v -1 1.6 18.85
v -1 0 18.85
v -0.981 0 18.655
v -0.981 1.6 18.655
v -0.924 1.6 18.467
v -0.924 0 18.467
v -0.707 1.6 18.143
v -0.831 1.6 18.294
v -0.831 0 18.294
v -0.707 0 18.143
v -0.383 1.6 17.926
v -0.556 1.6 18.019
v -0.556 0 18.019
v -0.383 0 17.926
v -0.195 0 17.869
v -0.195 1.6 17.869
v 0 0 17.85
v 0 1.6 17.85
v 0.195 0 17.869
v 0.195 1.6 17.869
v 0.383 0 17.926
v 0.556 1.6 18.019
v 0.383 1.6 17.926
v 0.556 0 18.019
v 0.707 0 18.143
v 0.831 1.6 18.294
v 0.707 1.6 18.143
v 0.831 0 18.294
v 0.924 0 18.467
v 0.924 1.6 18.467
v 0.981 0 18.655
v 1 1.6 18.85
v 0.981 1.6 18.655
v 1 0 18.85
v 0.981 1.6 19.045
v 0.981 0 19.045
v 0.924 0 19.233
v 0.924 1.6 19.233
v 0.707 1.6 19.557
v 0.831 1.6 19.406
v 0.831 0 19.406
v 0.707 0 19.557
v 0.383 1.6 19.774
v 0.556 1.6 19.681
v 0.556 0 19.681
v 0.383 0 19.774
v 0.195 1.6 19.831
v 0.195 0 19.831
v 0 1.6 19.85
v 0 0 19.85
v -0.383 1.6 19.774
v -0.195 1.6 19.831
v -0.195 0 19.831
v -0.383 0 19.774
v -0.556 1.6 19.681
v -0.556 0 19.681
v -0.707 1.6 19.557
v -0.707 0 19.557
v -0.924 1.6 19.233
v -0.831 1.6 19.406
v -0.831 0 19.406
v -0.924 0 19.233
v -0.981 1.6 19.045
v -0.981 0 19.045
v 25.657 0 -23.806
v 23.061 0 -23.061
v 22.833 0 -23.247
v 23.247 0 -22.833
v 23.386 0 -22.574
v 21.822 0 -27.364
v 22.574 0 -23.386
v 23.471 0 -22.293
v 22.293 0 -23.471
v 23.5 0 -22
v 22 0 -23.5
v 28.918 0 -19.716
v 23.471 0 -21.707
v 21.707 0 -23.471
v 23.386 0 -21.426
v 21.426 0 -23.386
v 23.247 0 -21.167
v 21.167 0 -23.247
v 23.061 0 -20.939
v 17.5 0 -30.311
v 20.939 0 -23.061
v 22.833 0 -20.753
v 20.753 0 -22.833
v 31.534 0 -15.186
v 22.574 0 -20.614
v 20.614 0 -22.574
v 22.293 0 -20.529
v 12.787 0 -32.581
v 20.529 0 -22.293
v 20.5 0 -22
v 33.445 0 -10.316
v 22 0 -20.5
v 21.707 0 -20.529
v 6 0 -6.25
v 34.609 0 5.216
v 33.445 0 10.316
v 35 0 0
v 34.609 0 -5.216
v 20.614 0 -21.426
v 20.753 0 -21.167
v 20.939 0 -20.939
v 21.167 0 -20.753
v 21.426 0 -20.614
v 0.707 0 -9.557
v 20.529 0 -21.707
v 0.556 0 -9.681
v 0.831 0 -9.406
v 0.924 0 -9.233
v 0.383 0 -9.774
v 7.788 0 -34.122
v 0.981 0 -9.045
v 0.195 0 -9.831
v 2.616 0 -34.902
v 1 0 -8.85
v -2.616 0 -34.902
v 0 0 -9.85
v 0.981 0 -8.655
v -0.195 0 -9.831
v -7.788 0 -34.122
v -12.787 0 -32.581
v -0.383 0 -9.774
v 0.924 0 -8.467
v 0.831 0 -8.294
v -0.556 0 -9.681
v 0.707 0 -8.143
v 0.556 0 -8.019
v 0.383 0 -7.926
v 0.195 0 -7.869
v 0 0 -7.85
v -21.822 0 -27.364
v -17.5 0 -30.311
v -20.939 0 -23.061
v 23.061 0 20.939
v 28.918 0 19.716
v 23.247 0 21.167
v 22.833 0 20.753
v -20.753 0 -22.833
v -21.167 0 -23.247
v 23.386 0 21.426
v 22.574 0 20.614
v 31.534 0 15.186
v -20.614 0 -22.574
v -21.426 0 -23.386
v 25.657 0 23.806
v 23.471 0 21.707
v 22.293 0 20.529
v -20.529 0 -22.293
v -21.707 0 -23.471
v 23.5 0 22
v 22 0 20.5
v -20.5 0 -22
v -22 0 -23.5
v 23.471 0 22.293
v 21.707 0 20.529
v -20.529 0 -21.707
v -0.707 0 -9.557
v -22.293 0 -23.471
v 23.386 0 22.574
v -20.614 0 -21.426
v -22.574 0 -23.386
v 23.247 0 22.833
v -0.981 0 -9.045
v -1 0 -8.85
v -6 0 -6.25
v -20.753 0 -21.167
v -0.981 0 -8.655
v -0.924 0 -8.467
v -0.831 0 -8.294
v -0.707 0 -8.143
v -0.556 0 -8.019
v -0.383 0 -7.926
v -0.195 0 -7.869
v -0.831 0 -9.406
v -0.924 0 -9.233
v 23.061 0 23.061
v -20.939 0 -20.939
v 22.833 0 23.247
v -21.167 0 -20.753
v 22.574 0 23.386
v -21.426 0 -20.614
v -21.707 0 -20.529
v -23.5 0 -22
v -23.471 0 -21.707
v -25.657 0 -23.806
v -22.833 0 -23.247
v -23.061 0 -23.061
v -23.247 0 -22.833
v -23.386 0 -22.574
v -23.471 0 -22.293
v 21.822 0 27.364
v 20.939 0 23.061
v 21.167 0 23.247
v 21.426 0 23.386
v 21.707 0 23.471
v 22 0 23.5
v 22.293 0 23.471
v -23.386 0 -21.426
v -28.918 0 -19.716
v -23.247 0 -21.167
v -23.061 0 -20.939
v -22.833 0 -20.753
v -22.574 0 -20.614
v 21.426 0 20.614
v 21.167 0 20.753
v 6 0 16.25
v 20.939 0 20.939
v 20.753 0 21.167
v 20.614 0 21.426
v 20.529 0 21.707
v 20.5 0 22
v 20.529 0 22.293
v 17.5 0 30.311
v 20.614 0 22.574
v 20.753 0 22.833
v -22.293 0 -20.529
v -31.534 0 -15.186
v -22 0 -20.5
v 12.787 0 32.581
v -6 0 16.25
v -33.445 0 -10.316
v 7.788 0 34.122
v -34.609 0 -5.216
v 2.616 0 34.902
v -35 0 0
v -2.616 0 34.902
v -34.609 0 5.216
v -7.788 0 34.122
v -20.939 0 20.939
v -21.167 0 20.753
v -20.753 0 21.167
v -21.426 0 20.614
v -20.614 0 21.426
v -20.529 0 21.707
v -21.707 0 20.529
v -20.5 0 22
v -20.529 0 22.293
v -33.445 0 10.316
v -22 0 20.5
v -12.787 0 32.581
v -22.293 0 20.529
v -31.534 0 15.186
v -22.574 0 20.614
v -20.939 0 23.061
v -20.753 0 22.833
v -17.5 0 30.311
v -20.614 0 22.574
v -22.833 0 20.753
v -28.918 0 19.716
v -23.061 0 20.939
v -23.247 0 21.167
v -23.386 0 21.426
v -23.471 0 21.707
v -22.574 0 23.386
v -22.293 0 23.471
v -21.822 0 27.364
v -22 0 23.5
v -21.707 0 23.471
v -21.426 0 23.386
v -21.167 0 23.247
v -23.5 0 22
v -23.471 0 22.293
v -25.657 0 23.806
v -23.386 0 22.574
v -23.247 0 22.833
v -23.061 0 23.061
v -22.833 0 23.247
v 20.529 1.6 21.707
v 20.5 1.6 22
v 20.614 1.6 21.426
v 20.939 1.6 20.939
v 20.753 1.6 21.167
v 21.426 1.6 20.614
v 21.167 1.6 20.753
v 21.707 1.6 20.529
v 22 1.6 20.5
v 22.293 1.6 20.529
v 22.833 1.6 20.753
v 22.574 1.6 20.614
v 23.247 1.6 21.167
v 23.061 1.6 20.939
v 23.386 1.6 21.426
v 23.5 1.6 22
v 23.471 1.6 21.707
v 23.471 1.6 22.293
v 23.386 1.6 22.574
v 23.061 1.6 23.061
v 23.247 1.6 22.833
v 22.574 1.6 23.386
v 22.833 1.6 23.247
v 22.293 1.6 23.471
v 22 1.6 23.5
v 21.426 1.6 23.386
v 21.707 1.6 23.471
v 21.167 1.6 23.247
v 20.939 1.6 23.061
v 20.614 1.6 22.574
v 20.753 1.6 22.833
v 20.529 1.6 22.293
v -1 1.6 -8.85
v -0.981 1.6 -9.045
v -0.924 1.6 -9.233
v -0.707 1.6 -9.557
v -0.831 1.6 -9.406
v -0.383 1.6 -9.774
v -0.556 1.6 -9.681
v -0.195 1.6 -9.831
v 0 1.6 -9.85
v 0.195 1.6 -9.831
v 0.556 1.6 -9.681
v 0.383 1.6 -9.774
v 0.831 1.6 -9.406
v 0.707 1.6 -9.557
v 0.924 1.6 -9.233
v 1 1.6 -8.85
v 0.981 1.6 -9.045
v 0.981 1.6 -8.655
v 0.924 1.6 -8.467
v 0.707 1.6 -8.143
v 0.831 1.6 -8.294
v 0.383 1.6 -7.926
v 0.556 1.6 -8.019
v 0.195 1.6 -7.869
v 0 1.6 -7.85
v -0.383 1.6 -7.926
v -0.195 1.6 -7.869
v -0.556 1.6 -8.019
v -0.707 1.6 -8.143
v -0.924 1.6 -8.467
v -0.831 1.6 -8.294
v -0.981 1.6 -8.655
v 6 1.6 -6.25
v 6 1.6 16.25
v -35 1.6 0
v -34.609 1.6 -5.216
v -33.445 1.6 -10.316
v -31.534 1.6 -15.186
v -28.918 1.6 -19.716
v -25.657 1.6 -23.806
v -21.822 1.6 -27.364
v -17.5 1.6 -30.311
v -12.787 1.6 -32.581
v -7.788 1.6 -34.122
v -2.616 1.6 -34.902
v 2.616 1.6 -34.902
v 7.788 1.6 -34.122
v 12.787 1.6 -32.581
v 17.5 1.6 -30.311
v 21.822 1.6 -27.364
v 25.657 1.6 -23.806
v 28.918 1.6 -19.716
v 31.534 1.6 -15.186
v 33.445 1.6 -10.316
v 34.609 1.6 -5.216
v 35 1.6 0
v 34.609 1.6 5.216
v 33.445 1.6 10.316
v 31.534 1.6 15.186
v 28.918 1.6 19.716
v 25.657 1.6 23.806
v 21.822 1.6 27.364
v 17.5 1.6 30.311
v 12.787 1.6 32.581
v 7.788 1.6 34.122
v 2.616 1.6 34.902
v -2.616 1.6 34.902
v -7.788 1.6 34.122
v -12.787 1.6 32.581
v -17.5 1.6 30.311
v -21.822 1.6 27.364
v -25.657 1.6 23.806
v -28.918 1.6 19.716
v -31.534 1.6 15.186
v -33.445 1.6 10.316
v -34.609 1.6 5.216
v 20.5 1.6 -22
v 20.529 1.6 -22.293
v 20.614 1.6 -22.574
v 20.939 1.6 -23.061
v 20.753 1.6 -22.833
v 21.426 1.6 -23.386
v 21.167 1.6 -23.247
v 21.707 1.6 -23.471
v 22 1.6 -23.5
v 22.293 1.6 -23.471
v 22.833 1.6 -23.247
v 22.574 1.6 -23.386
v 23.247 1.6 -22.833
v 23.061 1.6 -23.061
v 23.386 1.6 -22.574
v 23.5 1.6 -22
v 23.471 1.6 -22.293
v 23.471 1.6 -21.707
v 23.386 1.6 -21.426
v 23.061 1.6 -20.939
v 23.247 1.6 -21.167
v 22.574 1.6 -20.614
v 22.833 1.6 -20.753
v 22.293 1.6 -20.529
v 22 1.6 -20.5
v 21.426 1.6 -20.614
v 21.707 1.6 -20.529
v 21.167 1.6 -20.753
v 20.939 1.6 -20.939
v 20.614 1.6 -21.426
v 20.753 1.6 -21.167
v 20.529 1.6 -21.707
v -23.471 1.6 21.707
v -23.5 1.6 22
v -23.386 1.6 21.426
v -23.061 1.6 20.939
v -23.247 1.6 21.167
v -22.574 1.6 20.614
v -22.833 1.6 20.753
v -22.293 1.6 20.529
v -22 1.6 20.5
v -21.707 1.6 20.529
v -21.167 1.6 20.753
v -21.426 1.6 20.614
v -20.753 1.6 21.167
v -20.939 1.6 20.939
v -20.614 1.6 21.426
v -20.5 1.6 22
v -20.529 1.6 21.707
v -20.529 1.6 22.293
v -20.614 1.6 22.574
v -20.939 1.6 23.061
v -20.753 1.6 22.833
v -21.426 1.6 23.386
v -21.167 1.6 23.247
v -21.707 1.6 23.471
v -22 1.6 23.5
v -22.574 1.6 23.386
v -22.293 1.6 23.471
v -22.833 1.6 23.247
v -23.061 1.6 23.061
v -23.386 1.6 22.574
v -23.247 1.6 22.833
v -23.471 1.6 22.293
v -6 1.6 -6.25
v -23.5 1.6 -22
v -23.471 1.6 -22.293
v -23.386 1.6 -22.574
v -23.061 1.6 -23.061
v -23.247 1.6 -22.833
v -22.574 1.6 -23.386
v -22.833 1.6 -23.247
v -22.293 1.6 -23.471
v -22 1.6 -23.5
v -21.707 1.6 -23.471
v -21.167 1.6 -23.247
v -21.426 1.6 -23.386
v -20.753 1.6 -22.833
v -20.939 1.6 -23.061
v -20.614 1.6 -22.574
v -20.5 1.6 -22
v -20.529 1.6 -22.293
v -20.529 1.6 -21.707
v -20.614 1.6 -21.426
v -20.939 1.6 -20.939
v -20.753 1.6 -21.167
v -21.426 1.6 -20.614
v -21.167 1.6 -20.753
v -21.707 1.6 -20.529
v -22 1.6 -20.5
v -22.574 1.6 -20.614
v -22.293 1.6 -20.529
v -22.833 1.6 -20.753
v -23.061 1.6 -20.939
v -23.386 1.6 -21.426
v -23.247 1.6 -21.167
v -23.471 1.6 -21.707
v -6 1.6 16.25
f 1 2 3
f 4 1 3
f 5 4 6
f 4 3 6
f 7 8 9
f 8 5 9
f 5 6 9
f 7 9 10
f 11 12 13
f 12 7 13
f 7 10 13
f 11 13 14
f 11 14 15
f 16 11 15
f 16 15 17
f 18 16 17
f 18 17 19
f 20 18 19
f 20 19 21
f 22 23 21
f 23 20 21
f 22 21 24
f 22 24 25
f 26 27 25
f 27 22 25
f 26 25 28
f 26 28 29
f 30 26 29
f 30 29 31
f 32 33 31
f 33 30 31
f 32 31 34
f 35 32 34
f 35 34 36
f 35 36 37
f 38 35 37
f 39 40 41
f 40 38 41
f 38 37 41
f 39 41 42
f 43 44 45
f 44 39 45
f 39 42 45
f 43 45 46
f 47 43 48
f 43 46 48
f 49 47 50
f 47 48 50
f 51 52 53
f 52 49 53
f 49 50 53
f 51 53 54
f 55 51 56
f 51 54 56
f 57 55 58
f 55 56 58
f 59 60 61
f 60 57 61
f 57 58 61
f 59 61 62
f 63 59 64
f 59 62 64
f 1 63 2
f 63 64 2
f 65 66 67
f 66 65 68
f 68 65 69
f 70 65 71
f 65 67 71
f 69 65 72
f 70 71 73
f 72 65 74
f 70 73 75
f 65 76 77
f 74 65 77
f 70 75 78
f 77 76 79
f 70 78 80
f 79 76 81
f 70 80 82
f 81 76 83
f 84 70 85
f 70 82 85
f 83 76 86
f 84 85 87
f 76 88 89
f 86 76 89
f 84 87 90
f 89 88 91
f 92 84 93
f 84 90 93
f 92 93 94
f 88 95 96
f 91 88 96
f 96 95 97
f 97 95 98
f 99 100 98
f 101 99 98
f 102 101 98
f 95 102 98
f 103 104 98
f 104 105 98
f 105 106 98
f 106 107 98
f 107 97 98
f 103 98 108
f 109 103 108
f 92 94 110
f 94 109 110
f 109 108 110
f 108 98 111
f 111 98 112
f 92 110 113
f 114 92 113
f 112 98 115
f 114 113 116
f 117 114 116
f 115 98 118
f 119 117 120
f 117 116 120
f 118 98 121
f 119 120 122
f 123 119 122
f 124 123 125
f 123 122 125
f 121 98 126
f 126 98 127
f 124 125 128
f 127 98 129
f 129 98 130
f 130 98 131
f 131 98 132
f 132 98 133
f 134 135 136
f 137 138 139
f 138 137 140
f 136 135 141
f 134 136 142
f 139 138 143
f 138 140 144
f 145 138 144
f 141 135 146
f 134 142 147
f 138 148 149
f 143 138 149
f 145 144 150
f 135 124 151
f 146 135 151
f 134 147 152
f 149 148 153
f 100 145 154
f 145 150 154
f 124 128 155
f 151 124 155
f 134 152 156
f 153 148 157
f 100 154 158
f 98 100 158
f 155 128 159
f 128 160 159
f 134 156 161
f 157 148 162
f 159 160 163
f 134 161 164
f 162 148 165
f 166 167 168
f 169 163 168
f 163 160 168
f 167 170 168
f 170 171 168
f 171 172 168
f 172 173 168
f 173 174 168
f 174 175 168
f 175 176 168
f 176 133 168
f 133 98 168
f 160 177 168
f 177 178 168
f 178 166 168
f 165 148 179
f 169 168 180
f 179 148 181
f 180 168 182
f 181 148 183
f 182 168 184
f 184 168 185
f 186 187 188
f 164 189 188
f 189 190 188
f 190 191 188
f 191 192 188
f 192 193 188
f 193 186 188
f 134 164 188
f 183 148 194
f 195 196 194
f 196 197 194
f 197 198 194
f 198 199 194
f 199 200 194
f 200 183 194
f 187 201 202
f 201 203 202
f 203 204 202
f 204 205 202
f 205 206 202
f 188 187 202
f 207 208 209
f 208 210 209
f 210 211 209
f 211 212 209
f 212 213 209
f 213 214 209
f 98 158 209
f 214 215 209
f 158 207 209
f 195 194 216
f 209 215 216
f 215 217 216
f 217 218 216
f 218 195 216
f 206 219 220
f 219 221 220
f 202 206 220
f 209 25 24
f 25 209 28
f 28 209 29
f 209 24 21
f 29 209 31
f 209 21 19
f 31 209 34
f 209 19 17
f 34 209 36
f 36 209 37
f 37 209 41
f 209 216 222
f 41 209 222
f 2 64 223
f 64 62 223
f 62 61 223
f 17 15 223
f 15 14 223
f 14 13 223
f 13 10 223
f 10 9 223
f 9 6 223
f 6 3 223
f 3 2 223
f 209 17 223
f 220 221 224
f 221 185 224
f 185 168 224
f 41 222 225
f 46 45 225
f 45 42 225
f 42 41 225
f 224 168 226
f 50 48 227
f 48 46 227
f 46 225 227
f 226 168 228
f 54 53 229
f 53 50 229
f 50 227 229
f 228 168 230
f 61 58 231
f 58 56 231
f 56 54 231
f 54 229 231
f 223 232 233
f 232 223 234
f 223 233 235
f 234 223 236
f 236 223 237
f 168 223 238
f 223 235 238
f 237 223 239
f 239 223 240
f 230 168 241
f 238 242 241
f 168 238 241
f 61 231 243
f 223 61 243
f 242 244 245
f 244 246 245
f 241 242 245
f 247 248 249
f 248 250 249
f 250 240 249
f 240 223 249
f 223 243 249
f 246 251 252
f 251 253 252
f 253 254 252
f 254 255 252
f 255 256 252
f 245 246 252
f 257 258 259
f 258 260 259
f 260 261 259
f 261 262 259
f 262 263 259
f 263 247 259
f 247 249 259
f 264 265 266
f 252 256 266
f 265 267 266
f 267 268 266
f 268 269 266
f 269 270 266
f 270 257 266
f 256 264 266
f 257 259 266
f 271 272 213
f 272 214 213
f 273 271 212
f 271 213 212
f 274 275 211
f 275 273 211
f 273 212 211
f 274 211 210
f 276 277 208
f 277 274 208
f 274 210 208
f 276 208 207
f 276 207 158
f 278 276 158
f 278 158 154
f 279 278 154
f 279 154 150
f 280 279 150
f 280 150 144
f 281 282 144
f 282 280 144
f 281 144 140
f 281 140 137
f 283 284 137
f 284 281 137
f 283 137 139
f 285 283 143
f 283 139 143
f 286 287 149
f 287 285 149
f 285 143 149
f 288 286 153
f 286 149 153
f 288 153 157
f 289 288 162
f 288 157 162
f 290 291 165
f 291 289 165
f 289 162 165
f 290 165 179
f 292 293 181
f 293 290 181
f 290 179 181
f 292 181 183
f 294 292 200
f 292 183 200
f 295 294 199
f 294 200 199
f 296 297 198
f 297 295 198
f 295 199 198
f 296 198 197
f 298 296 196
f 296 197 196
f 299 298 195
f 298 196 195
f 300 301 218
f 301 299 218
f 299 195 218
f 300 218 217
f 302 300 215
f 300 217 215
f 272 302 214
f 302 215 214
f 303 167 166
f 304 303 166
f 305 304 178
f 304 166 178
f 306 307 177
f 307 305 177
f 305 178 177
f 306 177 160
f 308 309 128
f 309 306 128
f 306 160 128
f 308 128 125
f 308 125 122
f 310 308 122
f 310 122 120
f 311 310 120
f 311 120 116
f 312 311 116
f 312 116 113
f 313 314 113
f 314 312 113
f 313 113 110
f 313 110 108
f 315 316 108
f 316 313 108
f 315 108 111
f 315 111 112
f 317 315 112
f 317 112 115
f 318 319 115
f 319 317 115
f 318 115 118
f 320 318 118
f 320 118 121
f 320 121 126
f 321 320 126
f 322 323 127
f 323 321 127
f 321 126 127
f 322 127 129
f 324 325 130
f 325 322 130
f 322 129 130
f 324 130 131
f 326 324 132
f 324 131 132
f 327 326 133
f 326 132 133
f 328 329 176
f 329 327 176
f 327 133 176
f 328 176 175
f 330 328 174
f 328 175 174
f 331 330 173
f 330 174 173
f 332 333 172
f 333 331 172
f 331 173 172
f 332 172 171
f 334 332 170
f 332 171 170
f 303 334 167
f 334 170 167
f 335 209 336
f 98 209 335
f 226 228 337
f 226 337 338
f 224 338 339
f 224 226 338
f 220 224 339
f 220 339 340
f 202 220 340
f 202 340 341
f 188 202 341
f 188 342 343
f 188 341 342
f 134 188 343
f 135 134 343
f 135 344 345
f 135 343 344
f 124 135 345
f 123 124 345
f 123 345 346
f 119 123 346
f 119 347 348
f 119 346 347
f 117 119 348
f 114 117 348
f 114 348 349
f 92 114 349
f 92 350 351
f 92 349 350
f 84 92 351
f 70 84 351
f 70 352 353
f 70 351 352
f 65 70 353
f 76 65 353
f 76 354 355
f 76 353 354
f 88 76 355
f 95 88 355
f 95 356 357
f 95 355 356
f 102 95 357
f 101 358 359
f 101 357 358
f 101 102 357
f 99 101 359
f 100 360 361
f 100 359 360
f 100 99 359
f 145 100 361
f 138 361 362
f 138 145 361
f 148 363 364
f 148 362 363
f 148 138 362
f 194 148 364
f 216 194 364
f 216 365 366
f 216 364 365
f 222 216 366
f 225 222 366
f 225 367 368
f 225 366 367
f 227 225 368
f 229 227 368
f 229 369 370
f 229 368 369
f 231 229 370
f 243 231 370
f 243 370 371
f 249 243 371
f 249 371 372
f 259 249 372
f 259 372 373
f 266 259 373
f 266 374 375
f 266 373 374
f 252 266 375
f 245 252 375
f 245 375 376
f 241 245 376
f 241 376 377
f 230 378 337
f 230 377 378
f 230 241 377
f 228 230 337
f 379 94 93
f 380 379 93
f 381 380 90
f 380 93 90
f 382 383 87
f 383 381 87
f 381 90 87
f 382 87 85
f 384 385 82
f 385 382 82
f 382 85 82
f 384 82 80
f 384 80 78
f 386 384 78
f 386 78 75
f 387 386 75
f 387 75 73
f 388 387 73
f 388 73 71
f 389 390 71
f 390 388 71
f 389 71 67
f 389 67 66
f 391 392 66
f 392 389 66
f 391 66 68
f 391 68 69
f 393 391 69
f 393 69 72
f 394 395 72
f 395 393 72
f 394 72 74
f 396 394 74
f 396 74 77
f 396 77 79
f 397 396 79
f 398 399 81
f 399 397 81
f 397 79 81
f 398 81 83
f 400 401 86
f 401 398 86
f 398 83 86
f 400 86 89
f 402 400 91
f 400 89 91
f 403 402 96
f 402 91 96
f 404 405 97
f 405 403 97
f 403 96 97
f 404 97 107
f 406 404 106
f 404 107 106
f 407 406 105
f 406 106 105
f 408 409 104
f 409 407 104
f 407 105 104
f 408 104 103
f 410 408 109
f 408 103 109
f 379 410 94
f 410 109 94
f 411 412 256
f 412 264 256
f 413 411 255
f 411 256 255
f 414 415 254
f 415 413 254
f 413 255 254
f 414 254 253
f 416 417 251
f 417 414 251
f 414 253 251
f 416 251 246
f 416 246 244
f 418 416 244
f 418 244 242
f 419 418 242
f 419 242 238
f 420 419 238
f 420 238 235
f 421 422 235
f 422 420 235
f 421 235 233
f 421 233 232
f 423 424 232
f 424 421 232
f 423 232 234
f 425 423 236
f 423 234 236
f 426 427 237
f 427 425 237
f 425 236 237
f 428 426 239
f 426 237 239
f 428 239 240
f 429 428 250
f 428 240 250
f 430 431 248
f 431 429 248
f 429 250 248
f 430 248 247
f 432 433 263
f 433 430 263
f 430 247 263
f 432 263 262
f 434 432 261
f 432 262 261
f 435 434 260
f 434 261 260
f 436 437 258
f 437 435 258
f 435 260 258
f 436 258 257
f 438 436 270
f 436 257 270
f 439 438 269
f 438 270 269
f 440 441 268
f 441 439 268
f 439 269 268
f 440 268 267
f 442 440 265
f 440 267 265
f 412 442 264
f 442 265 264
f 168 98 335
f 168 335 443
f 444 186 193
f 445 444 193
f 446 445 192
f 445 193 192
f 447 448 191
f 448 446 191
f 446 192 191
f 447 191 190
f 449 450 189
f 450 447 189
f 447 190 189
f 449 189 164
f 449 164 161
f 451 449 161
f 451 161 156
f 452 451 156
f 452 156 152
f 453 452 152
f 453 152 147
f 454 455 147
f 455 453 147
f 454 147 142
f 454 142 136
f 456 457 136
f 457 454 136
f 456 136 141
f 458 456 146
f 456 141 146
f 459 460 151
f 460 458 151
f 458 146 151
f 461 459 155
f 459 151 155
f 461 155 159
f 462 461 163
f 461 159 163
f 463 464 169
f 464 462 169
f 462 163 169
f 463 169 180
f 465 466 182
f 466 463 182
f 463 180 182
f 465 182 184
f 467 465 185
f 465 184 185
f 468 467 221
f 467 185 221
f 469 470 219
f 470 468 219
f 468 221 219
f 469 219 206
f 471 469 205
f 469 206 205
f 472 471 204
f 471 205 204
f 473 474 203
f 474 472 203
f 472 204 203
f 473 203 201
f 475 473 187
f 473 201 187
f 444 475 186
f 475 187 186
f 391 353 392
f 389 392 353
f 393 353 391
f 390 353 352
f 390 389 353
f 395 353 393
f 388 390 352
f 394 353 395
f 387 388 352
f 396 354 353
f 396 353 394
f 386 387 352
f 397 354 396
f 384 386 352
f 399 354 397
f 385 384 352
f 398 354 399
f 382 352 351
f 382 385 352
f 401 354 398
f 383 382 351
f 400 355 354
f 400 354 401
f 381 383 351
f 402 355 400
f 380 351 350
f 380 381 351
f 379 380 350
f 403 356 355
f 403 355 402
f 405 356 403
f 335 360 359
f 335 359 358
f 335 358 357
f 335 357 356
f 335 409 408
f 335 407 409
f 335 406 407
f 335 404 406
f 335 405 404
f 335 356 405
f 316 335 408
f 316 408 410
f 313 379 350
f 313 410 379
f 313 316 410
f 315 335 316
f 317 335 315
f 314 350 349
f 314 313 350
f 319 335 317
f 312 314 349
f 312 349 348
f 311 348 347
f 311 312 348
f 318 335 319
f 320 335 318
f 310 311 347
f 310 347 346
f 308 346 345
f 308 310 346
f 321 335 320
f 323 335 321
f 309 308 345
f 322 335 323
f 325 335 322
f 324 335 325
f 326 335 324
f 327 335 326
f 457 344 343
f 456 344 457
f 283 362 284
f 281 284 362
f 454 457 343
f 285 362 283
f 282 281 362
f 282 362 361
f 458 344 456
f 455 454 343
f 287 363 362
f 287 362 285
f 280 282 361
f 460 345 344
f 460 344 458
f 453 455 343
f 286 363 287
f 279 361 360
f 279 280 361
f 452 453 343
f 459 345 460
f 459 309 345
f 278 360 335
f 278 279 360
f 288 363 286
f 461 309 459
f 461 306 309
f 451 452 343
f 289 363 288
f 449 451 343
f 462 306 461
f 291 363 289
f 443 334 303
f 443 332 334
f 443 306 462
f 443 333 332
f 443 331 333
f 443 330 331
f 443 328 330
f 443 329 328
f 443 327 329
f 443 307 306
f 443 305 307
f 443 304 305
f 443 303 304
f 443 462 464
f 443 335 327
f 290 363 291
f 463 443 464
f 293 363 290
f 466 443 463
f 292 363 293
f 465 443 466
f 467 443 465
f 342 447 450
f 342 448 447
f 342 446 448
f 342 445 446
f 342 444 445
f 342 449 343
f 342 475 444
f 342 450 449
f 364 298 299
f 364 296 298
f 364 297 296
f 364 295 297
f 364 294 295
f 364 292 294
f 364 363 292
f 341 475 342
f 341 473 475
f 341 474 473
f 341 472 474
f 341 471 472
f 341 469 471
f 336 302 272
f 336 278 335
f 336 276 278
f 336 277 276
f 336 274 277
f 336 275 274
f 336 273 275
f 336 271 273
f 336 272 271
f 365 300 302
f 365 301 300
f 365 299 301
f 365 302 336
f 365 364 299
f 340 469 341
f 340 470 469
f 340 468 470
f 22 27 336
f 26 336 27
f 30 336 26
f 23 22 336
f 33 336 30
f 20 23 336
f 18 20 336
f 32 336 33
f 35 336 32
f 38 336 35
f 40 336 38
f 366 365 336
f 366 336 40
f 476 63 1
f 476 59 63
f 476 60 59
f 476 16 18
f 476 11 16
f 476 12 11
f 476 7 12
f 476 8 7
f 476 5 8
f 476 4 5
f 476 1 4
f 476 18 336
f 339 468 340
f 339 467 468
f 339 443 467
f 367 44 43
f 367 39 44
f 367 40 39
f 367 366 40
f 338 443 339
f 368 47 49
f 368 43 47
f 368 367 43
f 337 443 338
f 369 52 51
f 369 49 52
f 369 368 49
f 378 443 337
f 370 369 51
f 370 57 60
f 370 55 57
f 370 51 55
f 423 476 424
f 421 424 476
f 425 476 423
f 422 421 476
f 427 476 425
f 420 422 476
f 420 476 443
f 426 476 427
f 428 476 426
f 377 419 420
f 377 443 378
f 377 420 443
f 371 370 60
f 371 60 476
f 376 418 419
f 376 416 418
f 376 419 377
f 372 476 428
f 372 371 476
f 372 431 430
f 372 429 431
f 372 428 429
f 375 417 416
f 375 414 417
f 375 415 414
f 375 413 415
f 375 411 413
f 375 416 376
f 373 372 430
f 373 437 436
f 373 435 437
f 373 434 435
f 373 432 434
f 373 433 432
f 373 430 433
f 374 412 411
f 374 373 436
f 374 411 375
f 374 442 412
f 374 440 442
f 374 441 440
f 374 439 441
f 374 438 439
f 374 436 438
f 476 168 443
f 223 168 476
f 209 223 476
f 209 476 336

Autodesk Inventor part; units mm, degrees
ref_plane "YZ Plane" through (0, 0, 0) normal (1, 0, 0) x (0, 1, 0)
ref_plane "XZ Plane" through (0, 0, 0) normal (0, 1, 0) x (-1, 0, 0)
ref_plane "XY Plane" through (0, 0, 0) normal (0, 0, 1) x (1, 0, 0)
sketch "Szkic1" plane through (0, 0, 0) normal (0, 1, 0) x (-1, 0, 0)
  circle A0 centre (0, 0) radius 35
  line L0 (-6, -6.25) -> (6, -6.25)
  line L1 (6, -6.25) -> (6, 16.25)
  line L2 (6, 16.25) -> (-6, 16.25)
  line L3 (-6, 16.25) -> (-6, -6.25)
  circle A1 centre (0, 18.85) radius 1
  circle A2 centre (-22, -22) radius 1.5
  circle A3 centre (22, -22) radius 1.5
  circle A4 centre (22, 22) radius 1.5
  circle A5 centre (-22, 22) radius 1.5
  circle A6 centre (0, -8.85) radius 1
  dimension "d0" = 70
  dimension "d1" = 12
  dimension "d2" = 22.5
  dimension "d3" = 2
  dimension "d4" = 2.6
  dimension "d7" = 3
  dimension "d10" = 360
  dimension "d12" = 22
  dimension "d13" = 22
  dimension "d14" = 2
  dimension "d15" = 6
  dimension "d16" = 2.6
  dimension "d17" = 6
  dimension "d18" = 6.25
extrude "Wyciągnięcie proste1" add sketch "Szkic1" along normal blind 1.6
equation "\"d15\" = 0.5 * d1"
equation "\"d17\" = 0.5 * d1"
properties part number "podstawa"
